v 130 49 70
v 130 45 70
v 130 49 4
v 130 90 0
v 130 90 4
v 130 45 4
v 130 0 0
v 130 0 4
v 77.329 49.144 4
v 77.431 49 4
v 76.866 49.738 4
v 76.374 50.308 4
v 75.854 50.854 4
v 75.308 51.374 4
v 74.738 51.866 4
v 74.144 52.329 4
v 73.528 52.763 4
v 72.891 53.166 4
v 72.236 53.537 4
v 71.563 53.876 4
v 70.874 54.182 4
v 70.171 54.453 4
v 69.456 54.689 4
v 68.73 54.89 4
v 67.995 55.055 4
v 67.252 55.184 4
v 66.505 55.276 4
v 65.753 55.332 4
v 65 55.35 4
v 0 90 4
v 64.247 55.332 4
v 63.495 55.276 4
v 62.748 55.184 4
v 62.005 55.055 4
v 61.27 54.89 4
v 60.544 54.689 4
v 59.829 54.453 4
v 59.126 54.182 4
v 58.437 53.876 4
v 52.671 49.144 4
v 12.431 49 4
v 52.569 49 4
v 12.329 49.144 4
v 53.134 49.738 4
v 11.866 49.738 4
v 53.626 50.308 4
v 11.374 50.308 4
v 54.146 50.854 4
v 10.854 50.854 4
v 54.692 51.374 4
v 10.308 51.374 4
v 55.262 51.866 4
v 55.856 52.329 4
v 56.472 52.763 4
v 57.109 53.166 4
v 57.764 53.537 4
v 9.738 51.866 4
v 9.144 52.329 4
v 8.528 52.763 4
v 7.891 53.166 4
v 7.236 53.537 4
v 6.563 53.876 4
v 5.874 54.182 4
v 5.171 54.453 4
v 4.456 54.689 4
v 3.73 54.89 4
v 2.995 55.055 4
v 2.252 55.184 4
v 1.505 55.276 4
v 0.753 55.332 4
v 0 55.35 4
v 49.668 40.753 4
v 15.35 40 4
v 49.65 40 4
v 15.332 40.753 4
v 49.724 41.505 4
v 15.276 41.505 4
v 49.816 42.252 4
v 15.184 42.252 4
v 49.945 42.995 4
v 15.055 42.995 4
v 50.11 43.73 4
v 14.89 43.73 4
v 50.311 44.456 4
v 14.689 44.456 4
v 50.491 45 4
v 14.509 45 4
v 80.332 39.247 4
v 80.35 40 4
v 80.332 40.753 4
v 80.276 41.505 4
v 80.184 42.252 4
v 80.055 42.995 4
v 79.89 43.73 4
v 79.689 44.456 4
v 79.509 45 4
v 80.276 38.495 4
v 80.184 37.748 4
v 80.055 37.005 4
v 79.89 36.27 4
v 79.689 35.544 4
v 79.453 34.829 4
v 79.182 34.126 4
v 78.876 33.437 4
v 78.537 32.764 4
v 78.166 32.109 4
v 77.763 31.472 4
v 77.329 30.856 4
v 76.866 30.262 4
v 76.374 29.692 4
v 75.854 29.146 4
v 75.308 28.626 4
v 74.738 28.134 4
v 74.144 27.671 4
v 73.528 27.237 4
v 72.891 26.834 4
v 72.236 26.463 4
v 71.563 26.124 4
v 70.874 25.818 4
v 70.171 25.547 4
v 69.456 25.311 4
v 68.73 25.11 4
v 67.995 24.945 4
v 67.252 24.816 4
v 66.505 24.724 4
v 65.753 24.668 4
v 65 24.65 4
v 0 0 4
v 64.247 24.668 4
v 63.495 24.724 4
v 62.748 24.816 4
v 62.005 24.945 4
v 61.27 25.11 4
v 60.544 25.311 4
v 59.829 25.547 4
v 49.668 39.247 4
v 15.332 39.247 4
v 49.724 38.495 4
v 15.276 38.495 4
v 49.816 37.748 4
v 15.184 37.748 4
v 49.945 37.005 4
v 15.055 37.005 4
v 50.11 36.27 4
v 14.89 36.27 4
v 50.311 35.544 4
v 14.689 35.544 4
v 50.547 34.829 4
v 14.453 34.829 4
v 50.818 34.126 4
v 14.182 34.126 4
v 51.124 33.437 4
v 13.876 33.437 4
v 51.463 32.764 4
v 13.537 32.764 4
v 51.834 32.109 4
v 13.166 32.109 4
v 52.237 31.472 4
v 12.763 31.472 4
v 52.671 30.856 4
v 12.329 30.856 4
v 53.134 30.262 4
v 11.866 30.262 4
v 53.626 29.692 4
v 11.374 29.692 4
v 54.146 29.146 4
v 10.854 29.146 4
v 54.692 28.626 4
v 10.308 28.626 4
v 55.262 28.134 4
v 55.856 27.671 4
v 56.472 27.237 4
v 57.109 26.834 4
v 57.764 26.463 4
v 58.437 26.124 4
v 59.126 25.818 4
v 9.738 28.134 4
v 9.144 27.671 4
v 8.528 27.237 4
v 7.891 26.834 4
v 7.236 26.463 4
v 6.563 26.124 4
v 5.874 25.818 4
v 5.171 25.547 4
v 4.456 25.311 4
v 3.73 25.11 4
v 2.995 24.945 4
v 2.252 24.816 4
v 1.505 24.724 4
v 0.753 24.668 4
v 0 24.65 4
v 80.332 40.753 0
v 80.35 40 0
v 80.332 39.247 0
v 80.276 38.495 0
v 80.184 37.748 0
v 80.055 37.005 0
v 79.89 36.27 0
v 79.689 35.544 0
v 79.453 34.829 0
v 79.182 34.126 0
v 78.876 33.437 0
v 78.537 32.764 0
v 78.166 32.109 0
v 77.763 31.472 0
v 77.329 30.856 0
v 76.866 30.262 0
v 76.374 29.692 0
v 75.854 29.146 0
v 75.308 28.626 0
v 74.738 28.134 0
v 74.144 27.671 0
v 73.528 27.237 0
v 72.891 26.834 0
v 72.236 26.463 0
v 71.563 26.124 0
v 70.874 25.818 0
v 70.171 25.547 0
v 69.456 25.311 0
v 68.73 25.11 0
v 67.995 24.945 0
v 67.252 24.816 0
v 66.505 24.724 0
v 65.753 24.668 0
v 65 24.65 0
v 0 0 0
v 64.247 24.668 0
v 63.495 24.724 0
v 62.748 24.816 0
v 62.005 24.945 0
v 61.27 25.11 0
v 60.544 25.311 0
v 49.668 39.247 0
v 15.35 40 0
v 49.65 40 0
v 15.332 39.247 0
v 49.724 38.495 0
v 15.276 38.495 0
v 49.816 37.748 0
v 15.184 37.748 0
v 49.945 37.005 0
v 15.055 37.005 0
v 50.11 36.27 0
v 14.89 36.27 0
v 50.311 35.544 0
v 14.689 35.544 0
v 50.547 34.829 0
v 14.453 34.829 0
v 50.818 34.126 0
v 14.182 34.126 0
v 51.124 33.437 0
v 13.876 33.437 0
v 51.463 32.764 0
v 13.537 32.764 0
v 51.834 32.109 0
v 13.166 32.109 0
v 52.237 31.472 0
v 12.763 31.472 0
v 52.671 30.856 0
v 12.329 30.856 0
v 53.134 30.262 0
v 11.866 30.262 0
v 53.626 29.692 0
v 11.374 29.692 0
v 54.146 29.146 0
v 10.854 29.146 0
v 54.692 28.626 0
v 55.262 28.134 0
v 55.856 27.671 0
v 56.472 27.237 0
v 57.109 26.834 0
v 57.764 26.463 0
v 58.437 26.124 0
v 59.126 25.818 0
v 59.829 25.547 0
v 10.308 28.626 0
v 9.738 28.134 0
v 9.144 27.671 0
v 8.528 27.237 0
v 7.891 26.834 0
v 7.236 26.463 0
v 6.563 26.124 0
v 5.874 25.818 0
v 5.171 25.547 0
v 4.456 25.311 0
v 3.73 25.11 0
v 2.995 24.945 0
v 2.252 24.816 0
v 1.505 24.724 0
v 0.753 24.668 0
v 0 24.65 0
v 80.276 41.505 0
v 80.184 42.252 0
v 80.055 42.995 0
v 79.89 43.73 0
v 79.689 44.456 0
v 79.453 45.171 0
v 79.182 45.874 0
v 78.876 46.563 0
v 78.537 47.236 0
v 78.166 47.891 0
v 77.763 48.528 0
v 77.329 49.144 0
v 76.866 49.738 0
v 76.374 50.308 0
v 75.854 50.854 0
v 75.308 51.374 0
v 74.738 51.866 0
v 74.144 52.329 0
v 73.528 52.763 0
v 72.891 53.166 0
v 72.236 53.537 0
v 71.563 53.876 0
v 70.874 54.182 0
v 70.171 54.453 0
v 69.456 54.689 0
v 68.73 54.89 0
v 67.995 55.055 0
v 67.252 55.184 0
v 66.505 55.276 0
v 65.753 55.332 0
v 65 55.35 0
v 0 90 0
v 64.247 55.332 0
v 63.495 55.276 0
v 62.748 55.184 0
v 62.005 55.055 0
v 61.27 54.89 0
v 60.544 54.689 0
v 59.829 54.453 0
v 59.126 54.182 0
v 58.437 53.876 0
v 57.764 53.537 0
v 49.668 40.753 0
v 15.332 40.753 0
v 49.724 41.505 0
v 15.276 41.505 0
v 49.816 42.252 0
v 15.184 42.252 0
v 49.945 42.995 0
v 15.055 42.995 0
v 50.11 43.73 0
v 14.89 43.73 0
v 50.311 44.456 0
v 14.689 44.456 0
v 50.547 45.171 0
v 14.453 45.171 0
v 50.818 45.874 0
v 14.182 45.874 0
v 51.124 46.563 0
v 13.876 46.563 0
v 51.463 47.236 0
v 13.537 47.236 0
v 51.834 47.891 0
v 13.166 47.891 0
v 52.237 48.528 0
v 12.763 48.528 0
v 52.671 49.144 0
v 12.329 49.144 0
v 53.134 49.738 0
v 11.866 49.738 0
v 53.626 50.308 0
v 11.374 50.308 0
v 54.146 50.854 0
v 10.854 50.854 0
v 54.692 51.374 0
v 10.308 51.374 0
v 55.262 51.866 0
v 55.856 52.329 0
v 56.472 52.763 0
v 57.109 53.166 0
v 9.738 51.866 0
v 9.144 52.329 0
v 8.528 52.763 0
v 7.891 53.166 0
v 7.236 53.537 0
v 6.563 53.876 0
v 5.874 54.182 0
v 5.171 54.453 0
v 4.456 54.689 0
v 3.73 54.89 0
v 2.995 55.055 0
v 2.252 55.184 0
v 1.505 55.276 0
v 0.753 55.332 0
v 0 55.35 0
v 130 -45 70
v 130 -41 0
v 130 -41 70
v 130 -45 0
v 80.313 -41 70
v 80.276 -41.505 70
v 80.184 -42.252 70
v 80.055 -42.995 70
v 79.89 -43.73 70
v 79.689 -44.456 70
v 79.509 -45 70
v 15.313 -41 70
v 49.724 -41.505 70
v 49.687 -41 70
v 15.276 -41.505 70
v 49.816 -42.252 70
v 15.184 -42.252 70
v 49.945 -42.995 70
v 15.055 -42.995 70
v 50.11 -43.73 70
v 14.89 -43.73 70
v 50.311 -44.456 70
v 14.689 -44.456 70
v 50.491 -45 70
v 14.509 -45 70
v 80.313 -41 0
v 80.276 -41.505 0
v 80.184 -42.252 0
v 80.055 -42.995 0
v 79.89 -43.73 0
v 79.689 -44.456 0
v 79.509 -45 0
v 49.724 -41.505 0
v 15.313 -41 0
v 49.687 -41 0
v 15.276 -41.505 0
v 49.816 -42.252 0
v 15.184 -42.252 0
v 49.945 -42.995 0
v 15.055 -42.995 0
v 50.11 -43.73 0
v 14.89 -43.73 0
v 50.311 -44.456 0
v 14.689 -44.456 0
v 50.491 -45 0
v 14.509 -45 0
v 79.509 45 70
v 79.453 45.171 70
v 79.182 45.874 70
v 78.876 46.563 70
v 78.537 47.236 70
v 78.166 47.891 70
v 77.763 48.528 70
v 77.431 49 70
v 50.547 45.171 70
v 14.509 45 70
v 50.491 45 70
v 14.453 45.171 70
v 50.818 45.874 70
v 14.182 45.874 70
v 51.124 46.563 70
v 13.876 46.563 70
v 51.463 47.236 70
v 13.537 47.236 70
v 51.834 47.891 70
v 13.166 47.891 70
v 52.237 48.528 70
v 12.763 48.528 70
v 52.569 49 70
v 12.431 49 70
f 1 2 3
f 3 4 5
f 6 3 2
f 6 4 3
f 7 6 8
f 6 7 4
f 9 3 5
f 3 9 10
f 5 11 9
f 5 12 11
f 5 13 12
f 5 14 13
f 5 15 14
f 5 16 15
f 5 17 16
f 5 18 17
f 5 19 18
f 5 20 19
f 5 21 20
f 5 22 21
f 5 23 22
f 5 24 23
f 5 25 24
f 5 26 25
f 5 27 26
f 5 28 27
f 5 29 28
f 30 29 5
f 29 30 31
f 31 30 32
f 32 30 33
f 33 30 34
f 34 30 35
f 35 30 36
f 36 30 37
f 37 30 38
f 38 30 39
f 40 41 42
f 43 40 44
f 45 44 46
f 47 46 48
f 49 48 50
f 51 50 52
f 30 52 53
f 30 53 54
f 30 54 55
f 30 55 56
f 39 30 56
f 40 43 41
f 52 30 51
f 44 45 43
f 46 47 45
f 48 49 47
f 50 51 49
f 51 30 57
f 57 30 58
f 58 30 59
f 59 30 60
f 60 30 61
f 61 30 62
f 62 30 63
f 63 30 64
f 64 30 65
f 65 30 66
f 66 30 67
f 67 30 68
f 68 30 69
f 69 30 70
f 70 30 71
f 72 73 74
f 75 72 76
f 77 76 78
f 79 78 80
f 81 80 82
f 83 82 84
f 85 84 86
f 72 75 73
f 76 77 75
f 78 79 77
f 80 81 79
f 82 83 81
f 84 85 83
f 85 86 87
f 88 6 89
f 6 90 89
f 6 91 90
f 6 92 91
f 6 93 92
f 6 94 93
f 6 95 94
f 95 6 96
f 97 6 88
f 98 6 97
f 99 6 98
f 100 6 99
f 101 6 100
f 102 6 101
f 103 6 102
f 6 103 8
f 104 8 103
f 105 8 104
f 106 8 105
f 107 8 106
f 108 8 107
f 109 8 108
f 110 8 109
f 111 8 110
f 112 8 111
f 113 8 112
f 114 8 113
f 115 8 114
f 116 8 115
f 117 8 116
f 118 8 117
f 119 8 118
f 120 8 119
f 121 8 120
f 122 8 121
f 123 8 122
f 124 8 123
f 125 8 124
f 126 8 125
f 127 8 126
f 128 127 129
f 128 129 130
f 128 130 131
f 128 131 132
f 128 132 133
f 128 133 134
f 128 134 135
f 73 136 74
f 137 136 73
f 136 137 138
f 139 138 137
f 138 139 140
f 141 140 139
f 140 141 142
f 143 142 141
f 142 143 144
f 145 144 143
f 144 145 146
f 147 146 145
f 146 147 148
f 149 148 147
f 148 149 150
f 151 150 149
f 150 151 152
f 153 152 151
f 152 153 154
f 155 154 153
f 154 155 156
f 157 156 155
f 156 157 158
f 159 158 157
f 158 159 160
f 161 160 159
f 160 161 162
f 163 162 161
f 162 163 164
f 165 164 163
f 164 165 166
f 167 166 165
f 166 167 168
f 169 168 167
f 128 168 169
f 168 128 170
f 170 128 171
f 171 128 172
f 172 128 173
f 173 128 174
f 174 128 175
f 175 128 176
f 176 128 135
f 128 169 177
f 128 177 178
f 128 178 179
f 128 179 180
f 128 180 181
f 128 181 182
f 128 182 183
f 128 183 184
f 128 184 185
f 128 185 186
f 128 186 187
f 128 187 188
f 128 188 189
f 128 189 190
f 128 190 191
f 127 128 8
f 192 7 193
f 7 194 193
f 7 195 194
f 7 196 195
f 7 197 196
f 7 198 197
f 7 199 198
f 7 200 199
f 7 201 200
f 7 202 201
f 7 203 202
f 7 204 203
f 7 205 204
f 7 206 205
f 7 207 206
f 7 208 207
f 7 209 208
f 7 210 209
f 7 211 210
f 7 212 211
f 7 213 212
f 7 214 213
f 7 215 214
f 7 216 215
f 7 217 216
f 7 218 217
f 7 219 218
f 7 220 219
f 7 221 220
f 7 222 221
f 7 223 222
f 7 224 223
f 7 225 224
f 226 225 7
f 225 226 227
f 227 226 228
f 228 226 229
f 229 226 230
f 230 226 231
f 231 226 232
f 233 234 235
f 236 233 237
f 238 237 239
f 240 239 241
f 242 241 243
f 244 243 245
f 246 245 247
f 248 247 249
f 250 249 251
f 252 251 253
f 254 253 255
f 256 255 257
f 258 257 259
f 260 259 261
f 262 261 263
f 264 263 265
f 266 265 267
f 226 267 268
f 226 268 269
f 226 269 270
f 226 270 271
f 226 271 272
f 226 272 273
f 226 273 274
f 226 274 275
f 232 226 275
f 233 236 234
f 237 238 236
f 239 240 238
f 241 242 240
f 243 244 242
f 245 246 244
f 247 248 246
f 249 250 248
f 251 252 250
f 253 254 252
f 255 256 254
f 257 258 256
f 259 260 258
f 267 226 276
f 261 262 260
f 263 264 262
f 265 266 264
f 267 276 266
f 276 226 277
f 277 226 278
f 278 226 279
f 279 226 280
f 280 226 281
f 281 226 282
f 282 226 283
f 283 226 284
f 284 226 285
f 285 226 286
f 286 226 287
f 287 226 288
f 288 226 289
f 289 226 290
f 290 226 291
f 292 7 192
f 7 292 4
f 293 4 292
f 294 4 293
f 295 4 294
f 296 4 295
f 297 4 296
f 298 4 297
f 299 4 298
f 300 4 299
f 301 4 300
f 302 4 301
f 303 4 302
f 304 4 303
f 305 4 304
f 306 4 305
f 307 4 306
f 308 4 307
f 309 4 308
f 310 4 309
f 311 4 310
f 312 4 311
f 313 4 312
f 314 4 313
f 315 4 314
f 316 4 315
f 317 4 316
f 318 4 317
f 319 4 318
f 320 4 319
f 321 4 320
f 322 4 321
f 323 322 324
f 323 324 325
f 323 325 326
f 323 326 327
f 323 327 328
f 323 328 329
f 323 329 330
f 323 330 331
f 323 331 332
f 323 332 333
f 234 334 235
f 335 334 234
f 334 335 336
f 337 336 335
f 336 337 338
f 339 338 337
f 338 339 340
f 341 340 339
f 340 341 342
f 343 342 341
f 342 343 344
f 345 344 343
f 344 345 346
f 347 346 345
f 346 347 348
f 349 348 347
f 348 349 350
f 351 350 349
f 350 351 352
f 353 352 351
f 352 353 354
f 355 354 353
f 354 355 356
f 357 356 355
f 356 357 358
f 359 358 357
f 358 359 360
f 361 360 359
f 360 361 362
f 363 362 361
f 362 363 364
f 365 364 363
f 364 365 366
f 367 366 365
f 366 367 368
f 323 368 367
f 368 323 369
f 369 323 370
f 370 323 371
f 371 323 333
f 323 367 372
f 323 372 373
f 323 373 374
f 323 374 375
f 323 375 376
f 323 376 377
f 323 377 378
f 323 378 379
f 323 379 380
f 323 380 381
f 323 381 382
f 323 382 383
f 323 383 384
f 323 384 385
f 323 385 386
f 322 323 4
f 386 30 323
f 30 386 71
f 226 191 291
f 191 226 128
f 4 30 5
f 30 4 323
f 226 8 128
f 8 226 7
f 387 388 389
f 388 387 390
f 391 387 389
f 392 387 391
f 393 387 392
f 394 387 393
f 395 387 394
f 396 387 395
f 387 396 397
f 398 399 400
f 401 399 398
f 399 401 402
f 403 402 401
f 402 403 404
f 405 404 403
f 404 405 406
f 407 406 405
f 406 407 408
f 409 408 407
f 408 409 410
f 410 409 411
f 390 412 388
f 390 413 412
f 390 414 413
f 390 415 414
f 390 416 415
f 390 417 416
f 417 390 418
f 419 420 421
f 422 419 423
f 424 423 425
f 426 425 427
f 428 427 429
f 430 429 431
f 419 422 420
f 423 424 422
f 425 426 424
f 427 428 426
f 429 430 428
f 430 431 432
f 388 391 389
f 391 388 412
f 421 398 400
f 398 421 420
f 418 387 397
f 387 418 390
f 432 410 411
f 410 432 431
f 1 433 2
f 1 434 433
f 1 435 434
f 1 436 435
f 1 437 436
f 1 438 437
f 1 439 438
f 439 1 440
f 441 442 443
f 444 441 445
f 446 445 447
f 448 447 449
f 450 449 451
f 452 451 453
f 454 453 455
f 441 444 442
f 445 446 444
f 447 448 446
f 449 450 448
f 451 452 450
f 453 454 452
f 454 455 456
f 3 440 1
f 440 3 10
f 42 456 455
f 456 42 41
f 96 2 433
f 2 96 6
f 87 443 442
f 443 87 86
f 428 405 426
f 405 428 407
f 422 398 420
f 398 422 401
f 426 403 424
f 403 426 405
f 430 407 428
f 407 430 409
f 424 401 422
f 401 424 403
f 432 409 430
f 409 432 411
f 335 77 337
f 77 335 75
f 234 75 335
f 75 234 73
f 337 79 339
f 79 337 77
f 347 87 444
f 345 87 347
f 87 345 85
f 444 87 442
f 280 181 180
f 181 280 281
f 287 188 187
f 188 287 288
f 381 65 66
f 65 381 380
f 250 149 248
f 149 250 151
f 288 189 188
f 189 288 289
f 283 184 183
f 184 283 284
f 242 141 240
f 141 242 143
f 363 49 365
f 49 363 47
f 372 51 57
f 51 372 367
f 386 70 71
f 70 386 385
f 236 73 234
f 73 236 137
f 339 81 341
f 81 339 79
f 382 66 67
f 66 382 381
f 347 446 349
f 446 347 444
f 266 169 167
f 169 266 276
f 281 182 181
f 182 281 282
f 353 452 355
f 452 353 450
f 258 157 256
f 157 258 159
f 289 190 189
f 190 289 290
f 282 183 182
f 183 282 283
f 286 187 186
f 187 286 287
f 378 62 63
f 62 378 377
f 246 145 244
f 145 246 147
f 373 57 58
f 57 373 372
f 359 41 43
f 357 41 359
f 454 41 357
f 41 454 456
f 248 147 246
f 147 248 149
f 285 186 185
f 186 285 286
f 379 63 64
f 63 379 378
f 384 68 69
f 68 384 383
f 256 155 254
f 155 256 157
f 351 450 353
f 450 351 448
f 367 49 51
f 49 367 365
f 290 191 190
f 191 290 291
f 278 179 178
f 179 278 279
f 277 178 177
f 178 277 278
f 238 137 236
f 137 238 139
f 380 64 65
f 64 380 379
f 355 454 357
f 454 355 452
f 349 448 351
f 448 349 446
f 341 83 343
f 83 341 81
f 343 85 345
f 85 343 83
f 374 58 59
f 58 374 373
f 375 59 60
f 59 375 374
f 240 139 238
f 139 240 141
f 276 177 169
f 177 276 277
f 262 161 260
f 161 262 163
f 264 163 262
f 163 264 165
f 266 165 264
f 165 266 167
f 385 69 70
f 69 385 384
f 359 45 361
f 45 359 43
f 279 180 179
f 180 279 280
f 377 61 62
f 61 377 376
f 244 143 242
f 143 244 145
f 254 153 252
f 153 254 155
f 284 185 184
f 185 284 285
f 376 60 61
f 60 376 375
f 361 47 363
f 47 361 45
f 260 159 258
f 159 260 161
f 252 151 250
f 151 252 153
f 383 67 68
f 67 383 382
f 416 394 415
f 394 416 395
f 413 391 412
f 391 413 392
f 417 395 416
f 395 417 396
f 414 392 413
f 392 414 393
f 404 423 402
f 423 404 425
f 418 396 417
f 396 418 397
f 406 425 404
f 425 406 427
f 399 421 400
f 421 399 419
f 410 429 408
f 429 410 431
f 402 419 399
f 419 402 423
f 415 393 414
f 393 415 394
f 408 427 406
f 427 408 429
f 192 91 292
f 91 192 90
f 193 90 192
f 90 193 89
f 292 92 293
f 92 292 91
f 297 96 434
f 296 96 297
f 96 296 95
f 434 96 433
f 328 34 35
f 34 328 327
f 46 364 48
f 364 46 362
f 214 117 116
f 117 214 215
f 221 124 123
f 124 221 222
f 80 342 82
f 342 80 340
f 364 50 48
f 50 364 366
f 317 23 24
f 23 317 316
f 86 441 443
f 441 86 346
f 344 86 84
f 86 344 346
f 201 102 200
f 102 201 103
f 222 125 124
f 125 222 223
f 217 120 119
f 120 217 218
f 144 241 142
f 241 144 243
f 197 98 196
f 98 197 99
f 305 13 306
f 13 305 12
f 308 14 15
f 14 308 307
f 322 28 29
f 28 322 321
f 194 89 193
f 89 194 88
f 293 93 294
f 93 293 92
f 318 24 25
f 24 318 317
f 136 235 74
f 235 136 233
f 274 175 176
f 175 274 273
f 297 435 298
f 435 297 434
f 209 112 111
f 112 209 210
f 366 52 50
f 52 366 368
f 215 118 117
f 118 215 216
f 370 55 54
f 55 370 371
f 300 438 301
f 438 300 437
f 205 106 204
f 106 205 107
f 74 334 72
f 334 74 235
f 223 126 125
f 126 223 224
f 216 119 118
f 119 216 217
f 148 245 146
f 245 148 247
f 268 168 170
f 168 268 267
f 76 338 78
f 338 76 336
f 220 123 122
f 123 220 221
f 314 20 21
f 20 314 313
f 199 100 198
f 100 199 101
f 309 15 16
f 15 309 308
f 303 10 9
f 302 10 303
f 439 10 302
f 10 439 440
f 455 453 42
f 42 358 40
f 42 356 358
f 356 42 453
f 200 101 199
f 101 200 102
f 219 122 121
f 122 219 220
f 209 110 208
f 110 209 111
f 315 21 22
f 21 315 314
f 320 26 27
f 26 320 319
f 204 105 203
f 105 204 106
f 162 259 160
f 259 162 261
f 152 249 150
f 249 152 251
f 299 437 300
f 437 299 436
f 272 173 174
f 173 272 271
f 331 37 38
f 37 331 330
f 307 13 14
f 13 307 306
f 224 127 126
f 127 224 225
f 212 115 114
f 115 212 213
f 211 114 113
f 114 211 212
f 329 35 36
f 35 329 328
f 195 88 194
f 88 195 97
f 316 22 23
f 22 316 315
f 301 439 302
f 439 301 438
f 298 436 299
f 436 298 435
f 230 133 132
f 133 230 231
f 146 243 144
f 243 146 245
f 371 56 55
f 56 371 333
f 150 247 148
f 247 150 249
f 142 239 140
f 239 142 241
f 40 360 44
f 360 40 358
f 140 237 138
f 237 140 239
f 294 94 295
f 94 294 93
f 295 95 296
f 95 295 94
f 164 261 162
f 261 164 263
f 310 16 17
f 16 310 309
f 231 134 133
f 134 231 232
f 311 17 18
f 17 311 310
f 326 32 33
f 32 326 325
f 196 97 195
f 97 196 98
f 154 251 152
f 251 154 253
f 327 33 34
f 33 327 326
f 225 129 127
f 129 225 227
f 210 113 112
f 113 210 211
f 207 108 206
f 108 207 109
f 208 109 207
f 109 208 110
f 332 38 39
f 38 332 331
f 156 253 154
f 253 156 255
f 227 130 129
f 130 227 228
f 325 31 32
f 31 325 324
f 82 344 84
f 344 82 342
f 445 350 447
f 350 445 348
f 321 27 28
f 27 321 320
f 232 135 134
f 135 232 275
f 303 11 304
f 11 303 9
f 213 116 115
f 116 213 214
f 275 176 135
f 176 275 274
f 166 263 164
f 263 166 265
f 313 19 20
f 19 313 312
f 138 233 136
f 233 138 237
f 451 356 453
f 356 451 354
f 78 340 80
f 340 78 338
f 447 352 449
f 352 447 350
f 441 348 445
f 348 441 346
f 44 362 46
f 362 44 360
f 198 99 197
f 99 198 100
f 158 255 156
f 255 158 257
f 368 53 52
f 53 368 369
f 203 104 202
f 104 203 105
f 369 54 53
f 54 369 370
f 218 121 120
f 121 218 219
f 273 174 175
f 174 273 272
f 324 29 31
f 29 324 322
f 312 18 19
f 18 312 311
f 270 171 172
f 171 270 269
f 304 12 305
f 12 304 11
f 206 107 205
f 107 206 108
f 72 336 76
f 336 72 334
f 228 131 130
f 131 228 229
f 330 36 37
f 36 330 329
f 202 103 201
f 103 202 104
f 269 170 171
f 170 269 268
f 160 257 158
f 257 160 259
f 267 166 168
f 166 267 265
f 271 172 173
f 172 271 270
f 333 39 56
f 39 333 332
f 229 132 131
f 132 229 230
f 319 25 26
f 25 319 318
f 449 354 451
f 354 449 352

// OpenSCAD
// Rack for six 50 mL conical (Falcon-type) tubes
// Print orientation: Upside down. Flat plate on bed (Z=0).
// After printing, flip over so walls stand on the bed and tubes insert from top.

// --- Dimensions ---
// Plate size
$plate_x = 130; // mm
$plate_y = 90;  // mm
$plate_z = 4;   // mm

// Hole specifications
$hole_diameter = 30.5; // mm
$hole_count_x = 3;     // 3 holes along X
$hole_count_y = 2;     // 2 holes along Y (rows)
$hole_spacing_x = 40;  // mm centre-to-centre
$hole_spacing_y = 40;  // mm centre-to-centre

// Wall specifications
$wall_length = 130;    // mm (along X)
$wall_thickness = 4;   // mm (along Y)
$wall_height = 70;     // mm (rise from plate)

// --- Derived Variables ---
// Calculate hole positions relative to plate center (0,0)
// X positions: -65, 0, 65 (since spacing is 40 and centered)
// Y positions: -40, 40 (since spacing is 40 and centered)
$hole_x_positions = [-65, 0, 65];
$hole_y_positions = [-40, 40];

// --- Configuration ---
$fn = 128; // High resolution for round holes

// --- Main Block ---
difference() {
    // 1. Create the base plate
    union() {
        // The plate itself
        translate([0, 0, 0]) 
            cube([$plate_x, $plate_y, $plate_z], center = false);
        
        // The two side walls
        // Wall 1: Left side (at Y = -$plate_y/2)
        translate([0, -$plate_y/2, 0]) 
            cube([$wall_length, $wall_thickness, $wall_height], center = false);
        
        // Wall 2: Right side (at Y = +$plate_y/2)
        translate([0, $plate_y/2, 0]) 
            cube([$wall_length, $wall_thickness, $wall_height], center = false);
    }
    
    // 2. Cut the holes
    // We iterate through the grid of holes
    for (xi = [0:$hole_count_x-1]) {
        for (yi = [0:$hole_count_y-1]) {
            // Calculate current hole center
            x_pos = $hole_x_positions[xi];
            y_pos = $hole_y_positions[yi];
            
            // Create a cylinder slightly larger than the hole to ensure clean cut
            // Extending 0.1mm past the face ensures no coplanar faces
            $cut_radius = ($hole_diameter / 2) + 0.1;
            
            translate([x_pos, y_pos, 0])
                cylinder(h = $wall_height + $plate_z + 1, r = $cut_radius, $fn = $fn);
        }
    }
}
